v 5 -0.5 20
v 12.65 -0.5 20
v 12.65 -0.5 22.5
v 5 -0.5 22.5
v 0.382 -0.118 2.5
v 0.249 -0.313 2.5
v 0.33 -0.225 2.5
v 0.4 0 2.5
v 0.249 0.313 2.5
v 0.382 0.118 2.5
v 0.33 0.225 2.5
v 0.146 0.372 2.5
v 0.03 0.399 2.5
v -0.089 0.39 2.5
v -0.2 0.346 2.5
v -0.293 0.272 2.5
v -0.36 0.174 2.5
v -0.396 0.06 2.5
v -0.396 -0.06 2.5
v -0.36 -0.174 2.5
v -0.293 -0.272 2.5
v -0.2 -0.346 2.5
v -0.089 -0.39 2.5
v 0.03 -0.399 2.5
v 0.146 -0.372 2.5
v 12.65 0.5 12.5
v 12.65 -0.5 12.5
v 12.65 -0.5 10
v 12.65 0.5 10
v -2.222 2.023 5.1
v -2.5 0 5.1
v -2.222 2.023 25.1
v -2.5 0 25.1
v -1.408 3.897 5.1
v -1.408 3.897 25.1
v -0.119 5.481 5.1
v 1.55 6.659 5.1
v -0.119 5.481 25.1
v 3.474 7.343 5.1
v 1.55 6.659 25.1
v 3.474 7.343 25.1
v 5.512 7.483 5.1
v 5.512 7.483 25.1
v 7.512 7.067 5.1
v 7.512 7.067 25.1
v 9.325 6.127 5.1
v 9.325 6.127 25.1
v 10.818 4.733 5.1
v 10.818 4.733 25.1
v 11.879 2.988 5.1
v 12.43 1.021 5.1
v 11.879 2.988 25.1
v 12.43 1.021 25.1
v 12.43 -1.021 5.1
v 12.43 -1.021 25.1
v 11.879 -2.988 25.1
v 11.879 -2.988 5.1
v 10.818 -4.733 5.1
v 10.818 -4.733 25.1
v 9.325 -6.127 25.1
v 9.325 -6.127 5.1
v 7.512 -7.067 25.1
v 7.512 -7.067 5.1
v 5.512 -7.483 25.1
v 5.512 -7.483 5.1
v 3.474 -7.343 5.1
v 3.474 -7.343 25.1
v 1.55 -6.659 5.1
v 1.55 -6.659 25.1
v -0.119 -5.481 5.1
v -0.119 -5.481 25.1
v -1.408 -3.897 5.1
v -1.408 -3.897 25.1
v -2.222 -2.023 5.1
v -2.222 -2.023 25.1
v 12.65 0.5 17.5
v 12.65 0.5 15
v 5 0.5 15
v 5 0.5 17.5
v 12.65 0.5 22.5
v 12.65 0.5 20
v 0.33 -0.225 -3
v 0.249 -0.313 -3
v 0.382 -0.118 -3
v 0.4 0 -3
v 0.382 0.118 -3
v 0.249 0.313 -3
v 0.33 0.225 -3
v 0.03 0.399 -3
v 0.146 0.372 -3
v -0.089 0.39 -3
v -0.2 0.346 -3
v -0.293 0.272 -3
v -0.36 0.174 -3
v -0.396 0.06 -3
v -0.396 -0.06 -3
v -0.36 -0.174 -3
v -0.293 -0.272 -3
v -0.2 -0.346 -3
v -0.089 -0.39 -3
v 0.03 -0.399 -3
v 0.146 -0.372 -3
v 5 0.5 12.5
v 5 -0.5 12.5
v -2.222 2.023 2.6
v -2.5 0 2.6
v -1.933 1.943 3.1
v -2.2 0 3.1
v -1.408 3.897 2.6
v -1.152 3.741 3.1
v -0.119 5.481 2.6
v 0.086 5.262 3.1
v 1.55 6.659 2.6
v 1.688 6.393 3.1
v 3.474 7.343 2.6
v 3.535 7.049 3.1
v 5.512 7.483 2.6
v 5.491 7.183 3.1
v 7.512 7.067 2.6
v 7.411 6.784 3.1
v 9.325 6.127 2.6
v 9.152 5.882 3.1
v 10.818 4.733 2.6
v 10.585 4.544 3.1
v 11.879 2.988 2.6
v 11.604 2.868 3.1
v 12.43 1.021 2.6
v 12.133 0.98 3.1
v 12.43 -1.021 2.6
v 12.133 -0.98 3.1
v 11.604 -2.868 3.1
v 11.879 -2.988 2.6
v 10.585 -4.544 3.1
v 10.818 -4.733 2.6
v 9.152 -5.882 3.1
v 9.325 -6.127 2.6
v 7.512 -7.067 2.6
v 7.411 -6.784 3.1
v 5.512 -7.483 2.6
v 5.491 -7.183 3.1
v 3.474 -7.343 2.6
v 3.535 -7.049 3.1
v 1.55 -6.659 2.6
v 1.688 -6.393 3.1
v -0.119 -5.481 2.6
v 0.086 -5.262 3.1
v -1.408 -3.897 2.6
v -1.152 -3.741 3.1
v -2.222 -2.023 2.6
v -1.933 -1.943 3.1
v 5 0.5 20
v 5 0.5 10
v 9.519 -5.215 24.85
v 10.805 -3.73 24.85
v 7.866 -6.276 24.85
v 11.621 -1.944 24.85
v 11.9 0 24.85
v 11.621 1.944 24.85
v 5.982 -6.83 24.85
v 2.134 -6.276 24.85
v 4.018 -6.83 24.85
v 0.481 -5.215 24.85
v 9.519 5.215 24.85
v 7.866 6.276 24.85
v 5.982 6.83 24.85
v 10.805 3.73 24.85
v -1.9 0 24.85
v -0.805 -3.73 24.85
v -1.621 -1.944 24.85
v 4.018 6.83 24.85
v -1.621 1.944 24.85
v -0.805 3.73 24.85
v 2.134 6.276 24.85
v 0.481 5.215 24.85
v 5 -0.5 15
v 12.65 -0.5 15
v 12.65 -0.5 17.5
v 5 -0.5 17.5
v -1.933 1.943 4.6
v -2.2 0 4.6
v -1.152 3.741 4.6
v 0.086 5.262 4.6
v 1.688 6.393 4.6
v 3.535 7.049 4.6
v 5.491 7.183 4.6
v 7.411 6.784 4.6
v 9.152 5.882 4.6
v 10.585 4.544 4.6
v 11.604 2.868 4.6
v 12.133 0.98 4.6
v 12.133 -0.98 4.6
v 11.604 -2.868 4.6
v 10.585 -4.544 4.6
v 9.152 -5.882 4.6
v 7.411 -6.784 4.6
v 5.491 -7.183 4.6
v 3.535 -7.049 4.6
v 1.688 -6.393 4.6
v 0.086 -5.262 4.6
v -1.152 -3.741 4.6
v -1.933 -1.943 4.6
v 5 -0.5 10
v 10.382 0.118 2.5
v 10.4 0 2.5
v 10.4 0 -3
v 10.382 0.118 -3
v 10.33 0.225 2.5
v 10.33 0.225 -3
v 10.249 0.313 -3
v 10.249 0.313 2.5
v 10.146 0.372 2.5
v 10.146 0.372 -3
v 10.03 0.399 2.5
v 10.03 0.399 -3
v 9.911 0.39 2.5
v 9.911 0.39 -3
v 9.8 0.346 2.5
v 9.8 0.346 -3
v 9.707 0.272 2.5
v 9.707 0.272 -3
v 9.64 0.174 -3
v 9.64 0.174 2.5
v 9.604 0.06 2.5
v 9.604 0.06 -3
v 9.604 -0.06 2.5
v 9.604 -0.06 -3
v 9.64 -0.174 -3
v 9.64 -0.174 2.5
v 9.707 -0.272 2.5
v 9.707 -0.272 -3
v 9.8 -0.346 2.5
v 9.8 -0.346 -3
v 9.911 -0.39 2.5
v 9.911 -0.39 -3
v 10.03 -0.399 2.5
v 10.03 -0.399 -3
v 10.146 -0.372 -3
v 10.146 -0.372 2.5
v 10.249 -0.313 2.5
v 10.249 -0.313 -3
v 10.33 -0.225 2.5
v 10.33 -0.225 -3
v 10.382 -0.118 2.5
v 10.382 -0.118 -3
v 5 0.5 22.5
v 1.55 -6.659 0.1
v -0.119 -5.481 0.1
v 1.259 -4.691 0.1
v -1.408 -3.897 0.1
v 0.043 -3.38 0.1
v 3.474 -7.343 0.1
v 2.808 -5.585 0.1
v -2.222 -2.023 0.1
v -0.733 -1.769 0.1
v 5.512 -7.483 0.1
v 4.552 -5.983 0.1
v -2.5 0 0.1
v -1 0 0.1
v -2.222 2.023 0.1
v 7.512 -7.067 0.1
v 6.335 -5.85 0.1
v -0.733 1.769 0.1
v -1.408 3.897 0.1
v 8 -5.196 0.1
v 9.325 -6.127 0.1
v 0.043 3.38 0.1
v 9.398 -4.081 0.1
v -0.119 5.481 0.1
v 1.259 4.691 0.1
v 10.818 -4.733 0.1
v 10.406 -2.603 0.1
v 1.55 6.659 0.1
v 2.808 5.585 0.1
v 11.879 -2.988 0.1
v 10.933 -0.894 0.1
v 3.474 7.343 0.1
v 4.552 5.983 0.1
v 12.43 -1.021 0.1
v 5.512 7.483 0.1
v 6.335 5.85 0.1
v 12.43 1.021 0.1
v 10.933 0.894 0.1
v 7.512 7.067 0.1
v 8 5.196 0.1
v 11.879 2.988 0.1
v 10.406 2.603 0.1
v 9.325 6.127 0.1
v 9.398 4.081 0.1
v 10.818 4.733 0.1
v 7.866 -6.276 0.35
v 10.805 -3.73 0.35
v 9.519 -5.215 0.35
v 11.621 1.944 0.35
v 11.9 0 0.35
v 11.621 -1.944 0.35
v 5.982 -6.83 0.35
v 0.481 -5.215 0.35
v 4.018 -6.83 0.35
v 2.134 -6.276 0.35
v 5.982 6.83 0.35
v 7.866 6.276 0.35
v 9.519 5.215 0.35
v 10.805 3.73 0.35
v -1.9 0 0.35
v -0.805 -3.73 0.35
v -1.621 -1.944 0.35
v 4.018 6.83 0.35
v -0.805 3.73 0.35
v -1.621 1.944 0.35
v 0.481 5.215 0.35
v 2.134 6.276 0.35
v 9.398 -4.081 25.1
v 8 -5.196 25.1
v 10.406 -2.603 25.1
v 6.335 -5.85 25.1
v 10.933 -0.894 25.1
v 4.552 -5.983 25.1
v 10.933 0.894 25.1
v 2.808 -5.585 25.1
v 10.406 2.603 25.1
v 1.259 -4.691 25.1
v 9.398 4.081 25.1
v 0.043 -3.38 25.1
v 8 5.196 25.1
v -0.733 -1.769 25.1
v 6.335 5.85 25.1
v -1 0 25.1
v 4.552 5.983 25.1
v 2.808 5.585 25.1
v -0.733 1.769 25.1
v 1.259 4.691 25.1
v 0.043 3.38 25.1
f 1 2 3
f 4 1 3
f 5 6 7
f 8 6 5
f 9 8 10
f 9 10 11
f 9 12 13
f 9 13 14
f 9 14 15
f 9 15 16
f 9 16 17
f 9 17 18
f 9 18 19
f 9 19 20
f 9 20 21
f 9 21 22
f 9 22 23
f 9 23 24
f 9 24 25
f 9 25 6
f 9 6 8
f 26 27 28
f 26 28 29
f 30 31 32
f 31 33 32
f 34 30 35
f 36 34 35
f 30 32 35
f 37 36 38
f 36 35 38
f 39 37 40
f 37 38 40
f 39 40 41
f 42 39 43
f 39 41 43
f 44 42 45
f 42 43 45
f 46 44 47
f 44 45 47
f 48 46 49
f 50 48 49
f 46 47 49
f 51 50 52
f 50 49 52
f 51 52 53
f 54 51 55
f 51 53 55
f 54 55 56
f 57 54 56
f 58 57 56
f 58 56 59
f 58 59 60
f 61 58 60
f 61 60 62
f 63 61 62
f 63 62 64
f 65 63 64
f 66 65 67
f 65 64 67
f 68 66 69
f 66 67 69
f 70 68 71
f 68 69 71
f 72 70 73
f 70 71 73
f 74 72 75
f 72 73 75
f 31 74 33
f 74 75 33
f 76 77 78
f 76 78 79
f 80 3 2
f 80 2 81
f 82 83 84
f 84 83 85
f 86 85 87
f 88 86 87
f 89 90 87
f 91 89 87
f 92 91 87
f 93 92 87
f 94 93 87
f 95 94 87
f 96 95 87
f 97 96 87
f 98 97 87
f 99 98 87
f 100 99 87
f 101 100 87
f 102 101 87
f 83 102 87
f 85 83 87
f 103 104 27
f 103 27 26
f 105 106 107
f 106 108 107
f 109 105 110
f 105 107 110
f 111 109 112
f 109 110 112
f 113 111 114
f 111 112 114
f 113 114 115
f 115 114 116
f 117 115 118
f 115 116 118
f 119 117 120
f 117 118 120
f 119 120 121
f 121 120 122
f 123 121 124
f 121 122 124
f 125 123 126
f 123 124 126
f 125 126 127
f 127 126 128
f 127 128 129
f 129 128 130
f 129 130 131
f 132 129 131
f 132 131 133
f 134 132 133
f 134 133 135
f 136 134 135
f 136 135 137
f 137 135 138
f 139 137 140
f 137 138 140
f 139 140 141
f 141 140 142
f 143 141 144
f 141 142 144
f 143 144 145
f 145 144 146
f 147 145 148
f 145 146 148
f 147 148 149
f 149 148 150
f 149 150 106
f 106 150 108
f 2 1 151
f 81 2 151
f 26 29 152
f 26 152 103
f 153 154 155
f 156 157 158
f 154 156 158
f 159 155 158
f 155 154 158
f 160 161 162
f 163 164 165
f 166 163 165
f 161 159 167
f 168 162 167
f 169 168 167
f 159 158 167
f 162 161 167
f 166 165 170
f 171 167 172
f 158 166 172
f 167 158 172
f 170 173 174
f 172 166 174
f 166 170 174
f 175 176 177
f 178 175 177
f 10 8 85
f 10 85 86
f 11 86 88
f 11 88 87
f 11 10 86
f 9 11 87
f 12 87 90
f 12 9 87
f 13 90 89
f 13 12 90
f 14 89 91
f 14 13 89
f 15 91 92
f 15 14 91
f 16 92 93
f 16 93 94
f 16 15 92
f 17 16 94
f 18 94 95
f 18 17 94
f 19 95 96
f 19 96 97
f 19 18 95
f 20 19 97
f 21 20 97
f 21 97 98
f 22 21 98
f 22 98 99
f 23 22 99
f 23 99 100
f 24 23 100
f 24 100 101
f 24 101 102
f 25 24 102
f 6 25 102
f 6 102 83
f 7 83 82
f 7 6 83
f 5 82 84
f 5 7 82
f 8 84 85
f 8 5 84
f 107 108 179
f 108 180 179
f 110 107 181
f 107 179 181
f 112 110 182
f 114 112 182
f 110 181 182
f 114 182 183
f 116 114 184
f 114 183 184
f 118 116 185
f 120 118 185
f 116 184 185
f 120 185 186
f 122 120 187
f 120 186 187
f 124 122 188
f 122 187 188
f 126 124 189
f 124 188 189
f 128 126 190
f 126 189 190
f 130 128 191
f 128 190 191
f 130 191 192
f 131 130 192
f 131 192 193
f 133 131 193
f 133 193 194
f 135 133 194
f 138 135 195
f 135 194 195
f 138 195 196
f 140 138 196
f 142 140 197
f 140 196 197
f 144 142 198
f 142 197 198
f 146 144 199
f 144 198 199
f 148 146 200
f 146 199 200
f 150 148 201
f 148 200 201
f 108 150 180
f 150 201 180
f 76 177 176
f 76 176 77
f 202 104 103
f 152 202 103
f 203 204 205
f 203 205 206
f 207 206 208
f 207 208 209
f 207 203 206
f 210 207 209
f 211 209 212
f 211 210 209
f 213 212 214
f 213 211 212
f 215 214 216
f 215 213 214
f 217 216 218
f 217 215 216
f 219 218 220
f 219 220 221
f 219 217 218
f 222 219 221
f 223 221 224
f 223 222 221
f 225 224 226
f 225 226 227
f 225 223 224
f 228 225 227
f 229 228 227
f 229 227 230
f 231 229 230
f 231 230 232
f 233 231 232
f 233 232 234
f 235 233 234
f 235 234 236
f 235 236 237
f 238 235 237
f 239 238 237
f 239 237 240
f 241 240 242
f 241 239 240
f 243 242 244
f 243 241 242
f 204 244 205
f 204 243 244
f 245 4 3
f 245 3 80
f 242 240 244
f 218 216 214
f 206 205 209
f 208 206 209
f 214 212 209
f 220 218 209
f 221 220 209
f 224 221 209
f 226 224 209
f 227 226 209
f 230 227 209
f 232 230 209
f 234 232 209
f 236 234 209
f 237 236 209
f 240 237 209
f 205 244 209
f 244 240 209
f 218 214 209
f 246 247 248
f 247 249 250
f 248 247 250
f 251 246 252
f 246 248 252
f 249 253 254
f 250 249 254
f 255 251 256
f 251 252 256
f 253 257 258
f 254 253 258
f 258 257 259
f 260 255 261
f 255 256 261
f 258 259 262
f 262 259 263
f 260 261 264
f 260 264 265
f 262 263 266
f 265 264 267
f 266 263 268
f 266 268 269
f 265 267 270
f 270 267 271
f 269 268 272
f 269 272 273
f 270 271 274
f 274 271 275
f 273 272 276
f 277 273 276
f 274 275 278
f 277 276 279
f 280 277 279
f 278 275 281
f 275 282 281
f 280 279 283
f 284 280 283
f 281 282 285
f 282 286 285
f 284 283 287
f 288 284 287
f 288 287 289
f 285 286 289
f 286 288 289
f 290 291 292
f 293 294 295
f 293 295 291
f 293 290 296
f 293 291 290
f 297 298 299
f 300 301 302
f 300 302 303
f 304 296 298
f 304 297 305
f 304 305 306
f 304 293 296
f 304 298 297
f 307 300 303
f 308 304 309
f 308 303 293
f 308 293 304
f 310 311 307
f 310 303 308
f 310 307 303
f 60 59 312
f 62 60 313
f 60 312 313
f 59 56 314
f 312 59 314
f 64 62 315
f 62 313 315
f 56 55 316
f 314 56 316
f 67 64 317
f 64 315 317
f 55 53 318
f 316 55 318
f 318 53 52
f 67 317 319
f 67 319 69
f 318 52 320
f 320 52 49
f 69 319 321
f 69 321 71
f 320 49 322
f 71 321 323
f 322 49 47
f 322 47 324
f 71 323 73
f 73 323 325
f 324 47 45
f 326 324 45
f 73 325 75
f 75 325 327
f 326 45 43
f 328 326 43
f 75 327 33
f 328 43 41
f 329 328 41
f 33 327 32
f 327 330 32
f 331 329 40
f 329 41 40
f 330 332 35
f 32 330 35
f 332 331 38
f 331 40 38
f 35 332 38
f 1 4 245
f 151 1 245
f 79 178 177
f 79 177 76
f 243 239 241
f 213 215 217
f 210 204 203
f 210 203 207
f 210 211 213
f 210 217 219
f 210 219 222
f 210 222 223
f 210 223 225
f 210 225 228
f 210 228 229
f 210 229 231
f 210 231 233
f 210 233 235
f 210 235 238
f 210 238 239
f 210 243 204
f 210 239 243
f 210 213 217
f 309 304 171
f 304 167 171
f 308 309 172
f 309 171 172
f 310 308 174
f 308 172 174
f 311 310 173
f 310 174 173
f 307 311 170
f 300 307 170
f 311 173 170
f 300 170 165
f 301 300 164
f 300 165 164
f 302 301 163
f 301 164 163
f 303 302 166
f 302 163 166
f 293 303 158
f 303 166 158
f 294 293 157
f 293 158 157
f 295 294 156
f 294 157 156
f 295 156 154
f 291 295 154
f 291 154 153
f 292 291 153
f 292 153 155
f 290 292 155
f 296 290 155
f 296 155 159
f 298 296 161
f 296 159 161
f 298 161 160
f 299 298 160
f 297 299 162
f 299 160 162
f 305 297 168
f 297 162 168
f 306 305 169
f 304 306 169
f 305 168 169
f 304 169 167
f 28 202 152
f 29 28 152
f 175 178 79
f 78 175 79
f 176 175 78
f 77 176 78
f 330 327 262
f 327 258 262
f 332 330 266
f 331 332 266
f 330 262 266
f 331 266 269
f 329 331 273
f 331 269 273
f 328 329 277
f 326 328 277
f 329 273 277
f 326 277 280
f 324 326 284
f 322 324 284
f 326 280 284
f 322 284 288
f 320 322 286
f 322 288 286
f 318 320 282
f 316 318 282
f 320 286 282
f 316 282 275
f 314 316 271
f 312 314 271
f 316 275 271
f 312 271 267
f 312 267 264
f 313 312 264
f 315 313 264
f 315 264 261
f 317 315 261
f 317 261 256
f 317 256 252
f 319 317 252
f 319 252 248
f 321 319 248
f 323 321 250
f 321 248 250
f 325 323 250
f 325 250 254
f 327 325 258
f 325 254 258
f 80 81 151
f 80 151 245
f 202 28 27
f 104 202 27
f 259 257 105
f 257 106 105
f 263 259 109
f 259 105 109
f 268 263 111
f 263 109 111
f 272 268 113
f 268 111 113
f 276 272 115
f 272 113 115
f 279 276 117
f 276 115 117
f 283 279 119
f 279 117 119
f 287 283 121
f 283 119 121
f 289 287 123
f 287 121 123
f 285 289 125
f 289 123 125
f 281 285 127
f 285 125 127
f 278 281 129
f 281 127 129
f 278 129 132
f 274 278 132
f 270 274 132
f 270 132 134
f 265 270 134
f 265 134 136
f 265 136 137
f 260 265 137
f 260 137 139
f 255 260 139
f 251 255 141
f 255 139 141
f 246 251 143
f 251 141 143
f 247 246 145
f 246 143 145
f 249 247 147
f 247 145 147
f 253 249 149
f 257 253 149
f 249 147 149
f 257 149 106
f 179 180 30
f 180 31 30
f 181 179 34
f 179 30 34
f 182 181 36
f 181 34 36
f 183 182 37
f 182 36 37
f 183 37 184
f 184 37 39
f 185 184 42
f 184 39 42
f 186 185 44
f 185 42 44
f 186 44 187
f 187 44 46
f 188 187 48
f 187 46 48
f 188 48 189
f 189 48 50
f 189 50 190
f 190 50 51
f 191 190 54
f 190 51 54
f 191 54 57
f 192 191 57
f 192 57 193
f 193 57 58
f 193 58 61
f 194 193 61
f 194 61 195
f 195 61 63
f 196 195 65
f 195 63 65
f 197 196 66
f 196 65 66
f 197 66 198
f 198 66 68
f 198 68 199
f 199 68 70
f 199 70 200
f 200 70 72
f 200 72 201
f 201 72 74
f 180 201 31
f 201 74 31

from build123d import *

# Parameters (mm, degrees)
SKETCH002_W  = 6.9
SKETCH002_H  = 24.5
SKETCH003_R  = 0.4
PAD_DEPTH    = 5.5
SKETCH004_W  = 1
SKETCH004_H  = 2.5
PAD001_DEPTH = 7.65


with BuildPart() as revolution:
    # Sketch → Revolution (revolve)
    with BuildSketch(Plane.XZ):
        Polygon((-2.5, 0.1), (-2.5, 2.6), (-2.2, 3.1), (-2.2, 4.6), (-2.5, 5.1), (-2.5, 25.1), (-1, 25.1), (-1, 0.1), align=None)
    revolve(axis=Axis((5, 0, 7.548619), (0, 0, -1)))


with BuildPart() as revolution001:
    # Sketch002 → Revolution001 (revolve)
    with BuildSketch(Plane.XZ):
        with Locations((1.55, 12.6)):
            Rectangle(SKETCH002_W, SKETCH002_H)
    revolve(axis=Axis((5, 0, 4.680116), (0, 0, -1)))


with BuildPart() as pad:
    # Sketch003 → Pad (new body)
    with BuildSketch(Plane.XY.offset(2.5)):
        Circle(SKETCH003_R)
        with Locations((10, 0)):
            Circle(SKETCH003_R)
    extrude(amount=-PAD_DEPTH)


with BuildPart() as pad001:
    # Sketch004 → Pad001 (new body)
    with BuildSketch(Plane.YZ.offset(5)):
        with Locations((0, 11.25)):
            Rectangle(SKETCH004_W, SKETCH004_H)
        with Locations((0, 16.25)):
            Rectangle(SKETCH004_W, SKETCH004_H)
        with Locations((0, 21.25)):
            Rectangle(SKETCH004_W, SKETCH004_H)
    extrude(amount=PAD001_DEPTH)


solid = Compound([revolution.part, revolution001.part, pad.part, pad001.part])
